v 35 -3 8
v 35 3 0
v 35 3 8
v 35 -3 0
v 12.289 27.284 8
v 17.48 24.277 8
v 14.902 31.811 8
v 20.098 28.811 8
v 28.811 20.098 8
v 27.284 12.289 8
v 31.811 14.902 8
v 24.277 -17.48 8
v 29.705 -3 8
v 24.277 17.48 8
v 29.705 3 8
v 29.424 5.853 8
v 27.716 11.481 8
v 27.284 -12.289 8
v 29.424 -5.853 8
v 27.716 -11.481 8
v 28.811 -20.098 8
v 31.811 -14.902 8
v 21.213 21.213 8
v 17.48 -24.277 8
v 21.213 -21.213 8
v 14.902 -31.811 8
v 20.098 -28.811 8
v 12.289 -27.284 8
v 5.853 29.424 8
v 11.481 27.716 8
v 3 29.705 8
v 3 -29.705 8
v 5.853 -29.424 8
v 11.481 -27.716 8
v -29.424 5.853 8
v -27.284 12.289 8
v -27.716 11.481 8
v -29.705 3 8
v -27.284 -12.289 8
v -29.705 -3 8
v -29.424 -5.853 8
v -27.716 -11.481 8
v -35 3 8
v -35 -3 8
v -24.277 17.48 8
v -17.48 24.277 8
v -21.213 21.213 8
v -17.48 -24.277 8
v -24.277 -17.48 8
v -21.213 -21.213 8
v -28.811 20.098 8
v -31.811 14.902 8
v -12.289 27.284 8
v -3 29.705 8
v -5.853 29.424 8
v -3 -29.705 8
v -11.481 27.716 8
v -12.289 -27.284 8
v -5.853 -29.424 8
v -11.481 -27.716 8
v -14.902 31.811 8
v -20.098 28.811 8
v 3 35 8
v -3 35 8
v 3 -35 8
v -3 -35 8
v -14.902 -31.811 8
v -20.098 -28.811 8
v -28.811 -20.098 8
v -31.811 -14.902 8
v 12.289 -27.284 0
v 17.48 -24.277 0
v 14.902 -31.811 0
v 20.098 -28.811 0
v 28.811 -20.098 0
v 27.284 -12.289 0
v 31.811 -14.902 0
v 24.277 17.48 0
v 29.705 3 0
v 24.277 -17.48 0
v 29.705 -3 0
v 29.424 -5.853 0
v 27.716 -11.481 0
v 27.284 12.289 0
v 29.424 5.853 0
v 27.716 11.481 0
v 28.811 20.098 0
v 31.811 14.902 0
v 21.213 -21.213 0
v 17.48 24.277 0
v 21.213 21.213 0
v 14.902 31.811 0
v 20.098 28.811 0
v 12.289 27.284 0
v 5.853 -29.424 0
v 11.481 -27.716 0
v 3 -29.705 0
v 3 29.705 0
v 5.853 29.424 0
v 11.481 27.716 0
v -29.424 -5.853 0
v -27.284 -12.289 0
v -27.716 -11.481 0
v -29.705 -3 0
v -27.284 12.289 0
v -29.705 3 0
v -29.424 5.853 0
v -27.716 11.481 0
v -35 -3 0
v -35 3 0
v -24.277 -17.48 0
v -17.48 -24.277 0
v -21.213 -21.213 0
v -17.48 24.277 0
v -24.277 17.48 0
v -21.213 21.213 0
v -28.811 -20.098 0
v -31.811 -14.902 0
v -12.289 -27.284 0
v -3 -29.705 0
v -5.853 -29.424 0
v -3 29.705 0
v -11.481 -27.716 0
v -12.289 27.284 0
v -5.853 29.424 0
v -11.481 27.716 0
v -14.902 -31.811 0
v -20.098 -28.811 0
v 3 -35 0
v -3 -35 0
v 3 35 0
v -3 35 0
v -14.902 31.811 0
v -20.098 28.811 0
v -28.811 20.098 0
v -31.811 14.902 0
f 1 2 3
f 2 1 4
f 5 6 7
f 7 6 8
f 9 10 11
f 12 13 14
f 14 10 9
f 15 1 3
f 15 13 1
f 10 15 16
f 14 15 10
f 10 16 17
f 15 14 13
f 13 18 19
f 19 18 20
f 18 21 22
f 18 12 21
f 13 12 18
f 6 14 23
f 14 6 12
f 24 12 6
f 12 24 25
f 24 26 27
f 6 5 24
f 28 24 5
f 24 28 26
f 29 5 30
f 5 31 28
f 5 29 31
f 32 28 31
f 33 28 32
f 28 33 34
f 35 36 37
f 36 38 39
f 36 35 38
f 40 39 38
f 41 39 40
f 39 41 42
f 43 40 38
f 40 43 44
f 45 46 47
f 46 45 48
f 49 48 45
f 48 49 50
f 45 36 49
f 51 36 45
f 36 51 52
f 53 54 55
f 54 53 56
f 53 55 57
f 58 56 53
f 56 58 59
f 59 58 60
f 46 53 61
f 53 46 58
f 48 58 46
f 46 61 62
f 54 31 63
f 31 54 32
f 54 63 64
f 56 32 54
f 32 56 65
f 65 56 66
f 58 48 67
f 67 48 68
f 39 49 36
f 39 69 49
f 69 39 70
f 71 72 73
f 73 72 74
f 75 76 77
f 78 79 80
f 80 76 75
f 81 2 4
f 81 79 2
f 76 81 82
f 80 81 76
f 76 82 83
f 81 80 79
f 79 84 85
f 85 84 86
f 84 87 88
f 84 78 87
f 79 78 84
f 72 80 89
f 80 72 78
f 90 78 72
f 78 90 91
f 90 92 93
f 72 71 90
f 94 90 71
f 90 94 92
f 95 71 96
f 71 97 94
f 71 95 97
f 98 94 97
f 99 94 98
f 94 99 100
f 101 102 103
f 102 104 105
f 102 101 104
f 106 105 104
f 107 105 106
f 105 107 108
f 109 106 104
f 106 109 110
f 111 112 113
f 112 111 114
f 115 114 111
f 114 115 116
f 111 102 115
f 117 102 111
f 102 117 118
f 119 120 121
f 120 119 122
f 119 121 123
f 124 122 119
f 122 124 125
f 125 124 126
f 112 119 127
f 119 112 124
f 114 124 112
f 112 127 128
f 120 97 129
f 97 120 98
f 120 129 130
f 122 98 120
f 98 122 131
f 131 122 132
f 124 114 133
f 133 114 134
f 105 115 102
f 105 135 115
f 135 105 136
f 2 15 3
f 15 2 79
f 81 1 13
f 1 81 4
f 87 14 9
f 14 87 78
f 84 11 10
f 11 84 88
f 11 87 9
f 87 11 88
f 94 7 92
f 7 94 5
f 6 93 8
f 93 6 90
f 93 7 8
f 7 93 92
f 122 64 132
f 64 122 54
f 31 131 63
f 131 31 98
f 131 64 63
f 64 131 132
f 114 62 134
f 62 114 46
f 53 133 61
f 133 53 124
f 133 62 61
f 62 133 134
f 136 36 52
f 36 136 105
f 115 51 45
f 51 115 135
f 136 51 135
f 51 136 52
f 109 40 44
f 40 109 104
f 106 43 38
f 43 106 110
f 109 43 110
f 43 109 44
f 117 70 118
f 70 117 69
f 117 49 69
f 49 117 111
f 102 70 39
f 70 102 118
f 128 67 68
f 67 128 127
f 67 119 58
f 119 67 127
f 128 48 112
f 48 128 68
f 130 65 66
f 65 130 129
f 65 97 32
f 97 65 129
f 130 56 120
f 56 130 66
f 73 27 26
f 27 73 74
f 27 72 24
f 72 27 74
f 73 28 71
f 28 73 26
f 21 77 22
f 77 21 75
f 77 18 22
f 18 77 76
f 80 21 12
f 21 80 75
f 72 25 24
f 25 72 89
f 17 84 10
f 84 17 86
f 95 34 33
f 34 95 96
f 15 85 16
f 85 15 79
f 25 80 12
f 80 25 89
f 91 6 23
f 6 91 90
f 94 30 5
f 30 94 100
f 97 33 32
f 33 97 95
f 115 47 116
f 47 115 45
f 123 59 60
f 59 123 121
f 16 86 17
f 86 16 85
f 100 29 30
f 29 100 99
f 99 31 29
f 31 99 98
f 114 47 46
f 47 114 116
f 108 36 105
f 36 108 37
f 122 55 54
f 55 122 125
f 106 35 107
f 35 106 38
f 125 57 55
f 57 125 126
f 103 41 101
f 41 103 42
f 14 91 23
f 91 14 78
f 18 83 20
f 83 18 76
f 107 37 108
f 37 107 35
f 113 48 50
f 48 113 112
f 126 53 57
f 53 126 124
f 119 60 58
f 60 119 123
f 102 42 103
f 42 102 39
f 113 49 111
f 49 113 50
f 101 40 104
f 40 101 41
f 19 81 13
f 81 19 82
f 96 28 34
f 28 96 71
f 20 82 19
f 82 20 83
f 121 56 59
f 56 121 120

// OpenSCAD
$fn = 32;

// ----------------------------------------------------------------------
// Spur blank: plain gear blank
// ----------------------------------------------------------------------

// --- parameters (mm) ---
disc_r = 30;              // blank root radius
disc_t = 8;               // blank thickness
n_teeth = 12;             // stub tooth count
tooth_w = 6;              // tooth width at the root
tooth_h = 5;              // tooth height above the root

out_r = disc_r + tooth_h;  // tip radius
bbox_x = 70.0;  // measured width over the teeth
bbox_y = 70.0;  // measured depth over the teeth

union() {
  cylinder(r = disc_r, h = disc_t);
  for (i = [0 : n_teeth - 1])
    rotate([0, 0, i * 360 / n_teeth])
      translate([disc_r - 1, -tooth_w / 2, 0])
        cube([tooth_h + 1, tooth_w, disc_t]);
}
